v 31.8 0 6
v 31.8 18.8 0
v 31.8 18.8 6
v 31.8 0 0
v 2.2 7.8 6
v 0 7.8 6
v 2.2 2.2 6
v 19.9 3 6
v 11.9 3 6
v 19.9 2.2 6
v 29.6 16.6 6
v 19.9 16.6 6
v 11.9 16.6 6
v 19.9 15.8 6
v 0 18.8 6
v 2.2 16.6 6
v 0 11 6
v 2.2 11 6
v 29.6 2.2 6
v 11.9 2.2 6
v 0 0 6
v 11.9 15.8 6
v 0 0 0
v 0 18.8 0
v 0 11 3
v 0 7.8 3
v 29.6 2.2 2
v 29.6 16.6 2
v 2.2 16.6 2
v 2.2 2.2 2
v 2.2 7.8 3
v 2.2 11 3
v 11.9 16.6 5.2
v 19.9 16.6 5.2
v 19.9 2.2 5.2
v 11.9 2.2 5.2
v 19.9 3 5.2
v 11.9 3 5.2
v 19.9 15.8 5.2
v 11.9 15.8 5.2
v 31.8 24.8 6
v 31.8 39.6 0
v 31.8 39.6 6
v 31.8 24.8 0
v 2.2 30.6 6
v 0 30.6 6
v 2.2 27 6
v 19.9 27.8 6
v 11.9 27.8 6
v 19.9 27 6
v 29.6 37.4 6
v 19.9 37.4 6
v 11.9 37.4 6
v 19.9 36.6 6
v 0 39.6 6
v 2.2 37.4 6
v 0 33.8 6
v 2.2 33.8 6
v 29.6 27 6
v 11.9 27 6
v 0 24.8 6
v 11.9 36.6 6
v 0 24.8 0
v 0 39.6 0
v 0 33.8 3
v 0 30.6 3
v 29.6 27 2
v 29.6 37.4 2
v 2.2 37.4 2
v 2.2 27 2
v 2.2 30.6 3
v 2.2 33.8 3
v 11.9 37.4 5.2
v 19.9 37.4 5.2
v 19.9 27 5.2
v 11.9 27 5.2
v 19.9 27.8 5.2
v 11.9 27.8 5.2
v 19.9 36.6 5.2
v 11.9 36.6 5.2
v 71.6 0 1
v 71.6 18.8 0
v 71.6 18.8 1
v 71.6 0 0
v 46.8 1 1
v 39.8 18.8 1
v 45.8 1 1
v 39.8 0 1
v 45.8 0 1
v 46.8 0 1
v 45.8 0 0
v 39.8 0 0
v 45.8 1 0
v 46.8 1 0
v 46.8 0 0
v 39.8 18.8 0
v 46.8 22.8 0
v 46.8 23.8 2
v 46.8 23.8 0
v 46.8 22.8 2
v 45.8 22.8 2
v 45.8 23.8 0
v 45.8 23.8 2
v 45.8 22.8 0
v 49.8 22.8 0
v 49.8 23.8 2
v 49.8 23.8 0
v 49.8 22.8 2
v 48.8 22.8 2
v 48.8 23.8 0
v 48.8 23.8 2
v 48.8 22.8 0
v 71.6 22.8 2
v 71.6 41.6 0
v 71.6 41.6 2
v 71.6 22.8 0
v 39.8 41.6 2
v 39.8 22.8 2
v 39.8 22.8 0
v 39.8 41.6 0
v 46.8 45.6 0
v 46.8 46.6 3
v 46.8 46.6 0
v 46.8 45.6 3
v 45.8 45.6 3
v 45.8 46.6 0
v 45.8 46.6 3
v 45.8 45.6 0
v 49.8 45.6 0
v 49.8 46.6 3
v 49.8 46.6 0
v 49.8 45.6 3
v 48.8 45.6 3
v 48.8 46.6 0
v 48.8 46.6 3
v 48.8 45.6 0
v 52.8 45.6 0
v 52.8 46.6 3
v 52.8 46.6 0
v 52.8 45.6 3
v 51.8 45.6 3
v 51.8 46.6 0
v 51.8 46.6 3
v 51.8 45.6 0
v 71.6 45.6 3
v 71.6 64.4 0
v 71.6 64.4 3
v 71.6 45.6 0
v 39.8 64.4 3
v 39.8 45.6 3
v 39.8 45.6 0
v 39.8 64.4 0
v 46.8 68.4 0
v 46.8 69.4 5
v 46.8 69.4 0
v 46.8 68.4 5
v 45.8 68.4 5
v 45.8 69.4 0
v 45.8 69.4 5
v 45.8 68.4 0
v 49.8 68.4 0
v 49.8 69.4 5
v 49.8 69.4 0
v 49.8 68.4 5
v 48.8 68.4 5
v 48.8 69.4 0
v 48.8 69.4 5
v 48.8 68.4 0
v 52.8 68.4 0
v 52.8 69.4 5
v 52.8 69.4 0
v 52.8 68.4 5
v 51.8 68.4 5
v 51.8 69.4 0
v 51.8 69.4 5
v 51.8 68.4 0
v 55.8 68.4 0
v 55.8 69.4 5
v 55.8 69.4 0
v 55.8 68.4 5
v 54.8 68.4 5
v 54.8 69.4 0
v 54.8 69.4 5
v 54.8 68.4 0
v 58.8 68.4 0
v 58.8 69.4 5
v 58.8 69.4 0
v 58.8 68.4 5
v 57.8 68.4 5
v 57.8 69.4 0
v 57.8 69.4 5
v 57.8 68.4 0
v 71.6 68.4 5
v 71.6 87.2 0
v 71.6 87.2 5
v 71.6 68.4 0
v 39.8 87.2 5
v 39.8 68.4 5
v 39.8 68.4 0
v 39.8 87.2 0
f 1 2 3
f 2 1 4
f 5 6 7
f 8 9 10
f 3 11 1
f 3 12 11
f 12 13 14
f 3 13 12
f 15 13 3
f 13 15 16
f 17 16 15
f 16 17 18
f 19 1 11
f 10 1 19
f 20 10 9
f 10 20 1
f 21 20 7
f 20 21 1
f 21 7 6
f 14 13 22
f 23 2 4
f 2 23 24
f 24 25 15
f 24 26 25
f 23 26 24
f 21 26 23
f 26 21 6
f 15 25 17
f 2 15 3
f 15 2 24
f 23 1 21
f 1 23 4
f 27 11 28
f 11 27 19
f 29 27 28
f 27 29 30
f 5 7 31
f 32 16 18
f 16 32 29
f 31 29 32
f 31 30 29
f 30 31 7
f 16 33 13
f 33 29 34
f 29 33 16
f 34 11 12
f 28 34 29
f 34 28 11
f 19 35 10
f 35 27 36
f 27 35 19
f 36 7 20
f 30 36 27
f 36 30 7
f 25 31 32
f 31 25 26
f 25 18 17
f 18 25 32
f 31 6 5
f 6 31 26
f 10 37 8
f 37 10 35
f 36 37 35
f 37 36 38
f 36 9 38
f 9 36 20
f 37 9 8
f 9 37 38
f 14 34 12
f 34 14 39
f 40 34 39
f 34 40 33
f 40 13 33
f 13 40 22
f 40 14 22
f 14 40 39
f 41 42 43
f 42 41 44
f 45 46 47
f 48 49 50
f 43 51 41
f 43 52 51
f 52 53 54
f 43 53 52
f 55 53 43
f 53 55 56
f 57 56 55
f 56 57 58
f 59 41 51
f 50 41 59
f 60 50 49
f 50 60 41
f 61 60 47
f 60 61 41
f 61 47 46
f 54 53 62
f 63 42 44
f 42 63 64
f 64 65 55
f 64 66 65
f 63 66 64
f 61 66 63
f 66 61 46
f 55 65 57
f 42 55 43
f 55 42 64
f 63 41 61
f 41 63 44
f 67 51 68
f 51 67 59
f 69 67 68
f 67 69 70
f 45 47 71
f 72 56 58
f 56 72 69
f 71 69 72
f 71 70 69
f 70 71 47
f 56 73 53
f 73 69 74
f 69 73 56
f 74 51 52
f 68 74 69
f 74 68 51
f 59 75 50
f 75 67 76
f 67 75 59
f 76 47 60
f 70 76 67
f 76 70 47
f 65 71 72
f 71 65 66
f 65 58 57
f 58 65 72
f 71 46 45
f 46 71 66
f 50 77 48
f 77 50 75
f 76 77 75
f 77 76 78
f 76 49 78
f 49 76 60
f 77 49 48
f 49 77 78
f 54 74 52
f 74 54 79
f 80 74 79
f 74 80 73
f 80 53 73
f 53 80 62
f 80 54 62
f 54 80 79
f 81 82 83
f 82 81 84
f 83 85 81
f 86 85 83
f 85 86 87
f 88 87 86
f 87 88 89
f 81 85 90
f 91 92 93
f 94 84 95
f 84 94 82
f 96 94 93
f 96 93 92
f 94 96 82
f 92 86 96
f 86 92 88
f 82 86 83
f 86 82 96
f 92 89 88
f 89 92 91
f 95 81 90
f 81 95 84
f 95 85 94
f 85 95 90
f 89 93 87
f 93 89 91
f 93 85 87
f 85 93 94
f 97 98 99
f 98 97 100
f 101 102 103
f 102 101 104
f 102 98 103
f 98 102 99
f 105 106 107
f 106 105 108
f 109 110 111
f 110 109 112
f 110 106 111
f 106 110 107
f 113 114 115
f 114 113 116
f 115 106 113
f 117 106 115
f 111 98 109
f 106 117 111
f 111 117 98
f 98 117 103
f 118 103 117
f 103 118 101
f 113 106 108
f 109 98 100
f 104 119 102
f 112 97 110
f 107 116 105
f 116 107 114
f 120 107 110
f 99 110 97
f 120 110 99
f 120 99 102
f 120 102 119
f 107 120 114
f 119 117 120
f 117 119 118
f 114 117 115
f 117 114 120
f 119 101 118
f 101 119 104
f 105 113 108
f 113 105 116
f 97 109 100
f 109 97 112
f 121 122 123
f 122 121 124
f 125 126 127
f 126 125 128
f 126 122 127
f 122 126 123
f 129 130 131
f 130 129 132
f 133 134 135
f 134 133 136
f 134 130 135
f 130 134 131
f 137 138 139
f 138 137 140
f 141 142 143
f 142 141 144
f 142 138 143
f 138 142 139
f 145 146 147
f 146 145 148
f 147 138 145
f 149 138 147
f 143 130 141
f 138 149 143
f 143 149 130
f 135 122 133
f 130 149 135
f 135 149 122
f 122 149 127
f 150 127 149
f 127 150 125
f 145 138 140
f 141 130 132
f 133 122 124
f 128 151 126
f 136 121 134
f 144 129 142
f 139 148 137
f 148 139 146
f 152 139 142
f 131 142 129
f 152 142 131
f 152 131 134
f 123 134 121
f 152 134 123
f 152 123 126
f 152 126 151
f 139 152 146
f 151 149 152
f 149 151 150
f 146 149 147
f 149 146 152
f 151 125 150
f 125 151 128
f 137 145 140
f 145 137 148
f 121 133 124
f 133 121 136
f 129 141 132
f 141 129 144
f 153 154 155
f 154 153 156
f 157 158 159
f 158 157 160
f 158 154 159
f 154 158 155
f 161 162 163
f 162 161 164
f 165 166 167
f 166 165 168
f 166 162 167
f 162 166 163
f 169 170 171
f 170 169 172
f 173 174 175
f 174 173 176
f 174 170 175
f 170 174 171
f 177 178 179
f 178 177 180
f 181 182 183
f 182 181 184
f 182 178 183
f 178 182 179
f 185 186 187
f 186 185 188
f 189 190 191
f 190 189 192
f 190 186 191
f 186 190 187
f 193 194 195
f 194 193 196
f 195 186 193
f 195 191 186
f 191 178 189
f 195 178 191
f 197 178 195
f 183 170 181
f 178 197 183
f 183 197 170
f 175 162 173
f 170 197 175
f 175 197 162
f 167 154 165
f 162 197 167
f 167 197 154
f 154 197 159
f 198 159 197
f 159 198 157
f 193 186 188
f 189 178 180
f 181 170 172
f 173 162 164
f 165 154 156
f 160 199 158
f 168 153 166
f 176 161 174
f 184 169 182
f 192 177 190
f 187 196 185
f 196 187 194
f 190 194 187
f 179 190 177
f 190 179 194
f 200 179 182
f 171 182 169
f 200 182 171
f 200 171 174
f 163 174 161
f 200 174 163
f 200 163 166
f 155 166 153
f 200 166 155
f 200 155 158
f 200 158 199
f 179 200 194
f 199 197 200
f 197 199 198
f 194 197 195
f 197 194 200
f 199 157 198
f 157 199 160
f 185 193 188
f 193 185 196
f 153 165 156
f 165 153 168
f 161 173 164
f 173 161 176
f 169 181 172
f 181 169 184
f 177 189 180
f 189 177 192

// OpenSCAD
// file: params.scad
// Every measurement of the parts the enclosures hold, in millimetres, in one place. The values come from the sellers' sheets of the parts in
// docs/hardware.md; measure the parts you received with a caliper and change them here before the final print (print fit_test.scad first).

$fn = 48;

// Fit and print
clearance = 0.4;        // gap around a part so it slides in
wall = 2.4;             // six perimeters of a 0.4 mm nozzle
floor_thickness = 2.0;
lid_thickness = 2.0;
lip = 1.6;              // height of the lid's inner lip

// ESP32 DevKit V1 (ESP-WROOM-32). The 30-pin board is 51.5 x 28.3; the 38-pin one is 55.3 x 28.3.
esp32_length = 51.5;
esp32_width = 28.3;
esp32_pcb = 1.6;
esp32_under = 9.0;      // header pins and solder below the board, so it rests on its edges
esp32_above = 6.0;      // the WROOM can and the buttons
usb_width = 12.0;       // opening for a micro-USB or USB-C plug with its overmould
usb_height = 8.0;

// HX711 module (green board)
hx711_length = 34.0;
hx711_width = 21.0;
hx711_height = 4.0;

// Perfboard with the buzzer transistor and the resistors
perf_length = 40.0;
perf_width = 30.0;

// Active buzzer, 12 x 9.5 mm
buzzer_diameter = 12.0;
buzzer_height = 9.5;

// RGB LED, 5 mm (10 mm: change to 10.0)
led_diameter = 5.0;

// Cables
probe_cable = 4.2;      // DS18B20 waterproof probe cable
reed_cable = 3.2;       // MC-38 cable

// Load cell, 5 kg bar (TAL220 type): two M5 holes at one end, two M4 at the other, 15 mm apart, 5 mm from each end
cell_length = 80.0;
cell_section = 12.7;
cell_hole_spacing = 15.0;
cell_hole_from_end = 5.0;
m4 = 4.4;
m5 = 5.4;
m3 = 3.3;

// MC-38 reed switch and its magnet
reed_length = 27.0;
reed_width = 14.0;
reed_height = 8.0;
magnet_length = 27.0;
magnet_width = 10.0;
magnet_height = 8.0;

// Mounting
disc_magnet_diameter = 10.0;   // 10 x 3 mm neodymium discs
disc_magnet_height = 3.0;
rubber_foot = 8.0;             // adhesive rubber bumpers
// main file
// Holders for the MC-38 reed switch (on the fridge body) and its magnet (on the door), and spacers that bring them level: every fridge has a
// different step between the body and the door, and the switch only closes within 15 to 25 mm of the magnet. Each part sticks on with foam
// tape; the spacers stack under either holder.
//
// part = "switch" | "magnet" | "spacers" | "all"

include <params.scad>

part = "all";

module holder(length, width, height) {
  difference() {
    cube([length + 2 * wall, width + 2 * wall, height / 2 + floor_thickness]);
    translate([wall - clearance / 2, wall - clearance / 2, floor_thickness]) cube([length + clearance, width + clearance, height]);
    // Notch for the cable at one end
    translate([-1, wall + width / 2 - reed_cable / 2, floor_thickness + 1]) cube([wall + 2, reed_cable, height]);
  }
  // Two small lips that snap over the part
  for (y = [wall - 0.6, wall + width + 0.6 - 1.2]) translate([wall + length / 2 - 4, y, height / 2 + floor_thickness - 0.8]) cube([8, 1.2, 0.8]);
}

module spacer(thickness) {
  difference() {
    cube([reed_length + 2 * wall, reed_width + 2 * wall, thickness]);
    // The thickness, as notches on the edge, so the spacers are told apart without reading
    for (i = [1 : thickness]) translate([3 + i * 3, -1, -1]) cube([1, 2, thickness + 2]);
  }
}

if (part == "switch") holder(reed_length, reed_width, reed_height);
if (part == "magnet") holder(magnet_length, magnet_width, magnet_height);
if (part == "spacers") for (i = [0 : 3]) translate([0, i * (reed_width + 2 * wall + 4), 0]) spacer([1, 2, 3, 5][i]);
if (part == "all") {
  holder(reed_length, reed_width, reed_height);
  translate([0, reed_width + 2 * wall + 6, 0]) holder(magnet_length, magnet_width, magnet_height);
  for (i = [0 : 3]) translate([reed_length + 2 * wall + 8, i * (reed_width + 2 * wall + 4), 0]) spacer([1, 2, 3, 5][i]);
}
